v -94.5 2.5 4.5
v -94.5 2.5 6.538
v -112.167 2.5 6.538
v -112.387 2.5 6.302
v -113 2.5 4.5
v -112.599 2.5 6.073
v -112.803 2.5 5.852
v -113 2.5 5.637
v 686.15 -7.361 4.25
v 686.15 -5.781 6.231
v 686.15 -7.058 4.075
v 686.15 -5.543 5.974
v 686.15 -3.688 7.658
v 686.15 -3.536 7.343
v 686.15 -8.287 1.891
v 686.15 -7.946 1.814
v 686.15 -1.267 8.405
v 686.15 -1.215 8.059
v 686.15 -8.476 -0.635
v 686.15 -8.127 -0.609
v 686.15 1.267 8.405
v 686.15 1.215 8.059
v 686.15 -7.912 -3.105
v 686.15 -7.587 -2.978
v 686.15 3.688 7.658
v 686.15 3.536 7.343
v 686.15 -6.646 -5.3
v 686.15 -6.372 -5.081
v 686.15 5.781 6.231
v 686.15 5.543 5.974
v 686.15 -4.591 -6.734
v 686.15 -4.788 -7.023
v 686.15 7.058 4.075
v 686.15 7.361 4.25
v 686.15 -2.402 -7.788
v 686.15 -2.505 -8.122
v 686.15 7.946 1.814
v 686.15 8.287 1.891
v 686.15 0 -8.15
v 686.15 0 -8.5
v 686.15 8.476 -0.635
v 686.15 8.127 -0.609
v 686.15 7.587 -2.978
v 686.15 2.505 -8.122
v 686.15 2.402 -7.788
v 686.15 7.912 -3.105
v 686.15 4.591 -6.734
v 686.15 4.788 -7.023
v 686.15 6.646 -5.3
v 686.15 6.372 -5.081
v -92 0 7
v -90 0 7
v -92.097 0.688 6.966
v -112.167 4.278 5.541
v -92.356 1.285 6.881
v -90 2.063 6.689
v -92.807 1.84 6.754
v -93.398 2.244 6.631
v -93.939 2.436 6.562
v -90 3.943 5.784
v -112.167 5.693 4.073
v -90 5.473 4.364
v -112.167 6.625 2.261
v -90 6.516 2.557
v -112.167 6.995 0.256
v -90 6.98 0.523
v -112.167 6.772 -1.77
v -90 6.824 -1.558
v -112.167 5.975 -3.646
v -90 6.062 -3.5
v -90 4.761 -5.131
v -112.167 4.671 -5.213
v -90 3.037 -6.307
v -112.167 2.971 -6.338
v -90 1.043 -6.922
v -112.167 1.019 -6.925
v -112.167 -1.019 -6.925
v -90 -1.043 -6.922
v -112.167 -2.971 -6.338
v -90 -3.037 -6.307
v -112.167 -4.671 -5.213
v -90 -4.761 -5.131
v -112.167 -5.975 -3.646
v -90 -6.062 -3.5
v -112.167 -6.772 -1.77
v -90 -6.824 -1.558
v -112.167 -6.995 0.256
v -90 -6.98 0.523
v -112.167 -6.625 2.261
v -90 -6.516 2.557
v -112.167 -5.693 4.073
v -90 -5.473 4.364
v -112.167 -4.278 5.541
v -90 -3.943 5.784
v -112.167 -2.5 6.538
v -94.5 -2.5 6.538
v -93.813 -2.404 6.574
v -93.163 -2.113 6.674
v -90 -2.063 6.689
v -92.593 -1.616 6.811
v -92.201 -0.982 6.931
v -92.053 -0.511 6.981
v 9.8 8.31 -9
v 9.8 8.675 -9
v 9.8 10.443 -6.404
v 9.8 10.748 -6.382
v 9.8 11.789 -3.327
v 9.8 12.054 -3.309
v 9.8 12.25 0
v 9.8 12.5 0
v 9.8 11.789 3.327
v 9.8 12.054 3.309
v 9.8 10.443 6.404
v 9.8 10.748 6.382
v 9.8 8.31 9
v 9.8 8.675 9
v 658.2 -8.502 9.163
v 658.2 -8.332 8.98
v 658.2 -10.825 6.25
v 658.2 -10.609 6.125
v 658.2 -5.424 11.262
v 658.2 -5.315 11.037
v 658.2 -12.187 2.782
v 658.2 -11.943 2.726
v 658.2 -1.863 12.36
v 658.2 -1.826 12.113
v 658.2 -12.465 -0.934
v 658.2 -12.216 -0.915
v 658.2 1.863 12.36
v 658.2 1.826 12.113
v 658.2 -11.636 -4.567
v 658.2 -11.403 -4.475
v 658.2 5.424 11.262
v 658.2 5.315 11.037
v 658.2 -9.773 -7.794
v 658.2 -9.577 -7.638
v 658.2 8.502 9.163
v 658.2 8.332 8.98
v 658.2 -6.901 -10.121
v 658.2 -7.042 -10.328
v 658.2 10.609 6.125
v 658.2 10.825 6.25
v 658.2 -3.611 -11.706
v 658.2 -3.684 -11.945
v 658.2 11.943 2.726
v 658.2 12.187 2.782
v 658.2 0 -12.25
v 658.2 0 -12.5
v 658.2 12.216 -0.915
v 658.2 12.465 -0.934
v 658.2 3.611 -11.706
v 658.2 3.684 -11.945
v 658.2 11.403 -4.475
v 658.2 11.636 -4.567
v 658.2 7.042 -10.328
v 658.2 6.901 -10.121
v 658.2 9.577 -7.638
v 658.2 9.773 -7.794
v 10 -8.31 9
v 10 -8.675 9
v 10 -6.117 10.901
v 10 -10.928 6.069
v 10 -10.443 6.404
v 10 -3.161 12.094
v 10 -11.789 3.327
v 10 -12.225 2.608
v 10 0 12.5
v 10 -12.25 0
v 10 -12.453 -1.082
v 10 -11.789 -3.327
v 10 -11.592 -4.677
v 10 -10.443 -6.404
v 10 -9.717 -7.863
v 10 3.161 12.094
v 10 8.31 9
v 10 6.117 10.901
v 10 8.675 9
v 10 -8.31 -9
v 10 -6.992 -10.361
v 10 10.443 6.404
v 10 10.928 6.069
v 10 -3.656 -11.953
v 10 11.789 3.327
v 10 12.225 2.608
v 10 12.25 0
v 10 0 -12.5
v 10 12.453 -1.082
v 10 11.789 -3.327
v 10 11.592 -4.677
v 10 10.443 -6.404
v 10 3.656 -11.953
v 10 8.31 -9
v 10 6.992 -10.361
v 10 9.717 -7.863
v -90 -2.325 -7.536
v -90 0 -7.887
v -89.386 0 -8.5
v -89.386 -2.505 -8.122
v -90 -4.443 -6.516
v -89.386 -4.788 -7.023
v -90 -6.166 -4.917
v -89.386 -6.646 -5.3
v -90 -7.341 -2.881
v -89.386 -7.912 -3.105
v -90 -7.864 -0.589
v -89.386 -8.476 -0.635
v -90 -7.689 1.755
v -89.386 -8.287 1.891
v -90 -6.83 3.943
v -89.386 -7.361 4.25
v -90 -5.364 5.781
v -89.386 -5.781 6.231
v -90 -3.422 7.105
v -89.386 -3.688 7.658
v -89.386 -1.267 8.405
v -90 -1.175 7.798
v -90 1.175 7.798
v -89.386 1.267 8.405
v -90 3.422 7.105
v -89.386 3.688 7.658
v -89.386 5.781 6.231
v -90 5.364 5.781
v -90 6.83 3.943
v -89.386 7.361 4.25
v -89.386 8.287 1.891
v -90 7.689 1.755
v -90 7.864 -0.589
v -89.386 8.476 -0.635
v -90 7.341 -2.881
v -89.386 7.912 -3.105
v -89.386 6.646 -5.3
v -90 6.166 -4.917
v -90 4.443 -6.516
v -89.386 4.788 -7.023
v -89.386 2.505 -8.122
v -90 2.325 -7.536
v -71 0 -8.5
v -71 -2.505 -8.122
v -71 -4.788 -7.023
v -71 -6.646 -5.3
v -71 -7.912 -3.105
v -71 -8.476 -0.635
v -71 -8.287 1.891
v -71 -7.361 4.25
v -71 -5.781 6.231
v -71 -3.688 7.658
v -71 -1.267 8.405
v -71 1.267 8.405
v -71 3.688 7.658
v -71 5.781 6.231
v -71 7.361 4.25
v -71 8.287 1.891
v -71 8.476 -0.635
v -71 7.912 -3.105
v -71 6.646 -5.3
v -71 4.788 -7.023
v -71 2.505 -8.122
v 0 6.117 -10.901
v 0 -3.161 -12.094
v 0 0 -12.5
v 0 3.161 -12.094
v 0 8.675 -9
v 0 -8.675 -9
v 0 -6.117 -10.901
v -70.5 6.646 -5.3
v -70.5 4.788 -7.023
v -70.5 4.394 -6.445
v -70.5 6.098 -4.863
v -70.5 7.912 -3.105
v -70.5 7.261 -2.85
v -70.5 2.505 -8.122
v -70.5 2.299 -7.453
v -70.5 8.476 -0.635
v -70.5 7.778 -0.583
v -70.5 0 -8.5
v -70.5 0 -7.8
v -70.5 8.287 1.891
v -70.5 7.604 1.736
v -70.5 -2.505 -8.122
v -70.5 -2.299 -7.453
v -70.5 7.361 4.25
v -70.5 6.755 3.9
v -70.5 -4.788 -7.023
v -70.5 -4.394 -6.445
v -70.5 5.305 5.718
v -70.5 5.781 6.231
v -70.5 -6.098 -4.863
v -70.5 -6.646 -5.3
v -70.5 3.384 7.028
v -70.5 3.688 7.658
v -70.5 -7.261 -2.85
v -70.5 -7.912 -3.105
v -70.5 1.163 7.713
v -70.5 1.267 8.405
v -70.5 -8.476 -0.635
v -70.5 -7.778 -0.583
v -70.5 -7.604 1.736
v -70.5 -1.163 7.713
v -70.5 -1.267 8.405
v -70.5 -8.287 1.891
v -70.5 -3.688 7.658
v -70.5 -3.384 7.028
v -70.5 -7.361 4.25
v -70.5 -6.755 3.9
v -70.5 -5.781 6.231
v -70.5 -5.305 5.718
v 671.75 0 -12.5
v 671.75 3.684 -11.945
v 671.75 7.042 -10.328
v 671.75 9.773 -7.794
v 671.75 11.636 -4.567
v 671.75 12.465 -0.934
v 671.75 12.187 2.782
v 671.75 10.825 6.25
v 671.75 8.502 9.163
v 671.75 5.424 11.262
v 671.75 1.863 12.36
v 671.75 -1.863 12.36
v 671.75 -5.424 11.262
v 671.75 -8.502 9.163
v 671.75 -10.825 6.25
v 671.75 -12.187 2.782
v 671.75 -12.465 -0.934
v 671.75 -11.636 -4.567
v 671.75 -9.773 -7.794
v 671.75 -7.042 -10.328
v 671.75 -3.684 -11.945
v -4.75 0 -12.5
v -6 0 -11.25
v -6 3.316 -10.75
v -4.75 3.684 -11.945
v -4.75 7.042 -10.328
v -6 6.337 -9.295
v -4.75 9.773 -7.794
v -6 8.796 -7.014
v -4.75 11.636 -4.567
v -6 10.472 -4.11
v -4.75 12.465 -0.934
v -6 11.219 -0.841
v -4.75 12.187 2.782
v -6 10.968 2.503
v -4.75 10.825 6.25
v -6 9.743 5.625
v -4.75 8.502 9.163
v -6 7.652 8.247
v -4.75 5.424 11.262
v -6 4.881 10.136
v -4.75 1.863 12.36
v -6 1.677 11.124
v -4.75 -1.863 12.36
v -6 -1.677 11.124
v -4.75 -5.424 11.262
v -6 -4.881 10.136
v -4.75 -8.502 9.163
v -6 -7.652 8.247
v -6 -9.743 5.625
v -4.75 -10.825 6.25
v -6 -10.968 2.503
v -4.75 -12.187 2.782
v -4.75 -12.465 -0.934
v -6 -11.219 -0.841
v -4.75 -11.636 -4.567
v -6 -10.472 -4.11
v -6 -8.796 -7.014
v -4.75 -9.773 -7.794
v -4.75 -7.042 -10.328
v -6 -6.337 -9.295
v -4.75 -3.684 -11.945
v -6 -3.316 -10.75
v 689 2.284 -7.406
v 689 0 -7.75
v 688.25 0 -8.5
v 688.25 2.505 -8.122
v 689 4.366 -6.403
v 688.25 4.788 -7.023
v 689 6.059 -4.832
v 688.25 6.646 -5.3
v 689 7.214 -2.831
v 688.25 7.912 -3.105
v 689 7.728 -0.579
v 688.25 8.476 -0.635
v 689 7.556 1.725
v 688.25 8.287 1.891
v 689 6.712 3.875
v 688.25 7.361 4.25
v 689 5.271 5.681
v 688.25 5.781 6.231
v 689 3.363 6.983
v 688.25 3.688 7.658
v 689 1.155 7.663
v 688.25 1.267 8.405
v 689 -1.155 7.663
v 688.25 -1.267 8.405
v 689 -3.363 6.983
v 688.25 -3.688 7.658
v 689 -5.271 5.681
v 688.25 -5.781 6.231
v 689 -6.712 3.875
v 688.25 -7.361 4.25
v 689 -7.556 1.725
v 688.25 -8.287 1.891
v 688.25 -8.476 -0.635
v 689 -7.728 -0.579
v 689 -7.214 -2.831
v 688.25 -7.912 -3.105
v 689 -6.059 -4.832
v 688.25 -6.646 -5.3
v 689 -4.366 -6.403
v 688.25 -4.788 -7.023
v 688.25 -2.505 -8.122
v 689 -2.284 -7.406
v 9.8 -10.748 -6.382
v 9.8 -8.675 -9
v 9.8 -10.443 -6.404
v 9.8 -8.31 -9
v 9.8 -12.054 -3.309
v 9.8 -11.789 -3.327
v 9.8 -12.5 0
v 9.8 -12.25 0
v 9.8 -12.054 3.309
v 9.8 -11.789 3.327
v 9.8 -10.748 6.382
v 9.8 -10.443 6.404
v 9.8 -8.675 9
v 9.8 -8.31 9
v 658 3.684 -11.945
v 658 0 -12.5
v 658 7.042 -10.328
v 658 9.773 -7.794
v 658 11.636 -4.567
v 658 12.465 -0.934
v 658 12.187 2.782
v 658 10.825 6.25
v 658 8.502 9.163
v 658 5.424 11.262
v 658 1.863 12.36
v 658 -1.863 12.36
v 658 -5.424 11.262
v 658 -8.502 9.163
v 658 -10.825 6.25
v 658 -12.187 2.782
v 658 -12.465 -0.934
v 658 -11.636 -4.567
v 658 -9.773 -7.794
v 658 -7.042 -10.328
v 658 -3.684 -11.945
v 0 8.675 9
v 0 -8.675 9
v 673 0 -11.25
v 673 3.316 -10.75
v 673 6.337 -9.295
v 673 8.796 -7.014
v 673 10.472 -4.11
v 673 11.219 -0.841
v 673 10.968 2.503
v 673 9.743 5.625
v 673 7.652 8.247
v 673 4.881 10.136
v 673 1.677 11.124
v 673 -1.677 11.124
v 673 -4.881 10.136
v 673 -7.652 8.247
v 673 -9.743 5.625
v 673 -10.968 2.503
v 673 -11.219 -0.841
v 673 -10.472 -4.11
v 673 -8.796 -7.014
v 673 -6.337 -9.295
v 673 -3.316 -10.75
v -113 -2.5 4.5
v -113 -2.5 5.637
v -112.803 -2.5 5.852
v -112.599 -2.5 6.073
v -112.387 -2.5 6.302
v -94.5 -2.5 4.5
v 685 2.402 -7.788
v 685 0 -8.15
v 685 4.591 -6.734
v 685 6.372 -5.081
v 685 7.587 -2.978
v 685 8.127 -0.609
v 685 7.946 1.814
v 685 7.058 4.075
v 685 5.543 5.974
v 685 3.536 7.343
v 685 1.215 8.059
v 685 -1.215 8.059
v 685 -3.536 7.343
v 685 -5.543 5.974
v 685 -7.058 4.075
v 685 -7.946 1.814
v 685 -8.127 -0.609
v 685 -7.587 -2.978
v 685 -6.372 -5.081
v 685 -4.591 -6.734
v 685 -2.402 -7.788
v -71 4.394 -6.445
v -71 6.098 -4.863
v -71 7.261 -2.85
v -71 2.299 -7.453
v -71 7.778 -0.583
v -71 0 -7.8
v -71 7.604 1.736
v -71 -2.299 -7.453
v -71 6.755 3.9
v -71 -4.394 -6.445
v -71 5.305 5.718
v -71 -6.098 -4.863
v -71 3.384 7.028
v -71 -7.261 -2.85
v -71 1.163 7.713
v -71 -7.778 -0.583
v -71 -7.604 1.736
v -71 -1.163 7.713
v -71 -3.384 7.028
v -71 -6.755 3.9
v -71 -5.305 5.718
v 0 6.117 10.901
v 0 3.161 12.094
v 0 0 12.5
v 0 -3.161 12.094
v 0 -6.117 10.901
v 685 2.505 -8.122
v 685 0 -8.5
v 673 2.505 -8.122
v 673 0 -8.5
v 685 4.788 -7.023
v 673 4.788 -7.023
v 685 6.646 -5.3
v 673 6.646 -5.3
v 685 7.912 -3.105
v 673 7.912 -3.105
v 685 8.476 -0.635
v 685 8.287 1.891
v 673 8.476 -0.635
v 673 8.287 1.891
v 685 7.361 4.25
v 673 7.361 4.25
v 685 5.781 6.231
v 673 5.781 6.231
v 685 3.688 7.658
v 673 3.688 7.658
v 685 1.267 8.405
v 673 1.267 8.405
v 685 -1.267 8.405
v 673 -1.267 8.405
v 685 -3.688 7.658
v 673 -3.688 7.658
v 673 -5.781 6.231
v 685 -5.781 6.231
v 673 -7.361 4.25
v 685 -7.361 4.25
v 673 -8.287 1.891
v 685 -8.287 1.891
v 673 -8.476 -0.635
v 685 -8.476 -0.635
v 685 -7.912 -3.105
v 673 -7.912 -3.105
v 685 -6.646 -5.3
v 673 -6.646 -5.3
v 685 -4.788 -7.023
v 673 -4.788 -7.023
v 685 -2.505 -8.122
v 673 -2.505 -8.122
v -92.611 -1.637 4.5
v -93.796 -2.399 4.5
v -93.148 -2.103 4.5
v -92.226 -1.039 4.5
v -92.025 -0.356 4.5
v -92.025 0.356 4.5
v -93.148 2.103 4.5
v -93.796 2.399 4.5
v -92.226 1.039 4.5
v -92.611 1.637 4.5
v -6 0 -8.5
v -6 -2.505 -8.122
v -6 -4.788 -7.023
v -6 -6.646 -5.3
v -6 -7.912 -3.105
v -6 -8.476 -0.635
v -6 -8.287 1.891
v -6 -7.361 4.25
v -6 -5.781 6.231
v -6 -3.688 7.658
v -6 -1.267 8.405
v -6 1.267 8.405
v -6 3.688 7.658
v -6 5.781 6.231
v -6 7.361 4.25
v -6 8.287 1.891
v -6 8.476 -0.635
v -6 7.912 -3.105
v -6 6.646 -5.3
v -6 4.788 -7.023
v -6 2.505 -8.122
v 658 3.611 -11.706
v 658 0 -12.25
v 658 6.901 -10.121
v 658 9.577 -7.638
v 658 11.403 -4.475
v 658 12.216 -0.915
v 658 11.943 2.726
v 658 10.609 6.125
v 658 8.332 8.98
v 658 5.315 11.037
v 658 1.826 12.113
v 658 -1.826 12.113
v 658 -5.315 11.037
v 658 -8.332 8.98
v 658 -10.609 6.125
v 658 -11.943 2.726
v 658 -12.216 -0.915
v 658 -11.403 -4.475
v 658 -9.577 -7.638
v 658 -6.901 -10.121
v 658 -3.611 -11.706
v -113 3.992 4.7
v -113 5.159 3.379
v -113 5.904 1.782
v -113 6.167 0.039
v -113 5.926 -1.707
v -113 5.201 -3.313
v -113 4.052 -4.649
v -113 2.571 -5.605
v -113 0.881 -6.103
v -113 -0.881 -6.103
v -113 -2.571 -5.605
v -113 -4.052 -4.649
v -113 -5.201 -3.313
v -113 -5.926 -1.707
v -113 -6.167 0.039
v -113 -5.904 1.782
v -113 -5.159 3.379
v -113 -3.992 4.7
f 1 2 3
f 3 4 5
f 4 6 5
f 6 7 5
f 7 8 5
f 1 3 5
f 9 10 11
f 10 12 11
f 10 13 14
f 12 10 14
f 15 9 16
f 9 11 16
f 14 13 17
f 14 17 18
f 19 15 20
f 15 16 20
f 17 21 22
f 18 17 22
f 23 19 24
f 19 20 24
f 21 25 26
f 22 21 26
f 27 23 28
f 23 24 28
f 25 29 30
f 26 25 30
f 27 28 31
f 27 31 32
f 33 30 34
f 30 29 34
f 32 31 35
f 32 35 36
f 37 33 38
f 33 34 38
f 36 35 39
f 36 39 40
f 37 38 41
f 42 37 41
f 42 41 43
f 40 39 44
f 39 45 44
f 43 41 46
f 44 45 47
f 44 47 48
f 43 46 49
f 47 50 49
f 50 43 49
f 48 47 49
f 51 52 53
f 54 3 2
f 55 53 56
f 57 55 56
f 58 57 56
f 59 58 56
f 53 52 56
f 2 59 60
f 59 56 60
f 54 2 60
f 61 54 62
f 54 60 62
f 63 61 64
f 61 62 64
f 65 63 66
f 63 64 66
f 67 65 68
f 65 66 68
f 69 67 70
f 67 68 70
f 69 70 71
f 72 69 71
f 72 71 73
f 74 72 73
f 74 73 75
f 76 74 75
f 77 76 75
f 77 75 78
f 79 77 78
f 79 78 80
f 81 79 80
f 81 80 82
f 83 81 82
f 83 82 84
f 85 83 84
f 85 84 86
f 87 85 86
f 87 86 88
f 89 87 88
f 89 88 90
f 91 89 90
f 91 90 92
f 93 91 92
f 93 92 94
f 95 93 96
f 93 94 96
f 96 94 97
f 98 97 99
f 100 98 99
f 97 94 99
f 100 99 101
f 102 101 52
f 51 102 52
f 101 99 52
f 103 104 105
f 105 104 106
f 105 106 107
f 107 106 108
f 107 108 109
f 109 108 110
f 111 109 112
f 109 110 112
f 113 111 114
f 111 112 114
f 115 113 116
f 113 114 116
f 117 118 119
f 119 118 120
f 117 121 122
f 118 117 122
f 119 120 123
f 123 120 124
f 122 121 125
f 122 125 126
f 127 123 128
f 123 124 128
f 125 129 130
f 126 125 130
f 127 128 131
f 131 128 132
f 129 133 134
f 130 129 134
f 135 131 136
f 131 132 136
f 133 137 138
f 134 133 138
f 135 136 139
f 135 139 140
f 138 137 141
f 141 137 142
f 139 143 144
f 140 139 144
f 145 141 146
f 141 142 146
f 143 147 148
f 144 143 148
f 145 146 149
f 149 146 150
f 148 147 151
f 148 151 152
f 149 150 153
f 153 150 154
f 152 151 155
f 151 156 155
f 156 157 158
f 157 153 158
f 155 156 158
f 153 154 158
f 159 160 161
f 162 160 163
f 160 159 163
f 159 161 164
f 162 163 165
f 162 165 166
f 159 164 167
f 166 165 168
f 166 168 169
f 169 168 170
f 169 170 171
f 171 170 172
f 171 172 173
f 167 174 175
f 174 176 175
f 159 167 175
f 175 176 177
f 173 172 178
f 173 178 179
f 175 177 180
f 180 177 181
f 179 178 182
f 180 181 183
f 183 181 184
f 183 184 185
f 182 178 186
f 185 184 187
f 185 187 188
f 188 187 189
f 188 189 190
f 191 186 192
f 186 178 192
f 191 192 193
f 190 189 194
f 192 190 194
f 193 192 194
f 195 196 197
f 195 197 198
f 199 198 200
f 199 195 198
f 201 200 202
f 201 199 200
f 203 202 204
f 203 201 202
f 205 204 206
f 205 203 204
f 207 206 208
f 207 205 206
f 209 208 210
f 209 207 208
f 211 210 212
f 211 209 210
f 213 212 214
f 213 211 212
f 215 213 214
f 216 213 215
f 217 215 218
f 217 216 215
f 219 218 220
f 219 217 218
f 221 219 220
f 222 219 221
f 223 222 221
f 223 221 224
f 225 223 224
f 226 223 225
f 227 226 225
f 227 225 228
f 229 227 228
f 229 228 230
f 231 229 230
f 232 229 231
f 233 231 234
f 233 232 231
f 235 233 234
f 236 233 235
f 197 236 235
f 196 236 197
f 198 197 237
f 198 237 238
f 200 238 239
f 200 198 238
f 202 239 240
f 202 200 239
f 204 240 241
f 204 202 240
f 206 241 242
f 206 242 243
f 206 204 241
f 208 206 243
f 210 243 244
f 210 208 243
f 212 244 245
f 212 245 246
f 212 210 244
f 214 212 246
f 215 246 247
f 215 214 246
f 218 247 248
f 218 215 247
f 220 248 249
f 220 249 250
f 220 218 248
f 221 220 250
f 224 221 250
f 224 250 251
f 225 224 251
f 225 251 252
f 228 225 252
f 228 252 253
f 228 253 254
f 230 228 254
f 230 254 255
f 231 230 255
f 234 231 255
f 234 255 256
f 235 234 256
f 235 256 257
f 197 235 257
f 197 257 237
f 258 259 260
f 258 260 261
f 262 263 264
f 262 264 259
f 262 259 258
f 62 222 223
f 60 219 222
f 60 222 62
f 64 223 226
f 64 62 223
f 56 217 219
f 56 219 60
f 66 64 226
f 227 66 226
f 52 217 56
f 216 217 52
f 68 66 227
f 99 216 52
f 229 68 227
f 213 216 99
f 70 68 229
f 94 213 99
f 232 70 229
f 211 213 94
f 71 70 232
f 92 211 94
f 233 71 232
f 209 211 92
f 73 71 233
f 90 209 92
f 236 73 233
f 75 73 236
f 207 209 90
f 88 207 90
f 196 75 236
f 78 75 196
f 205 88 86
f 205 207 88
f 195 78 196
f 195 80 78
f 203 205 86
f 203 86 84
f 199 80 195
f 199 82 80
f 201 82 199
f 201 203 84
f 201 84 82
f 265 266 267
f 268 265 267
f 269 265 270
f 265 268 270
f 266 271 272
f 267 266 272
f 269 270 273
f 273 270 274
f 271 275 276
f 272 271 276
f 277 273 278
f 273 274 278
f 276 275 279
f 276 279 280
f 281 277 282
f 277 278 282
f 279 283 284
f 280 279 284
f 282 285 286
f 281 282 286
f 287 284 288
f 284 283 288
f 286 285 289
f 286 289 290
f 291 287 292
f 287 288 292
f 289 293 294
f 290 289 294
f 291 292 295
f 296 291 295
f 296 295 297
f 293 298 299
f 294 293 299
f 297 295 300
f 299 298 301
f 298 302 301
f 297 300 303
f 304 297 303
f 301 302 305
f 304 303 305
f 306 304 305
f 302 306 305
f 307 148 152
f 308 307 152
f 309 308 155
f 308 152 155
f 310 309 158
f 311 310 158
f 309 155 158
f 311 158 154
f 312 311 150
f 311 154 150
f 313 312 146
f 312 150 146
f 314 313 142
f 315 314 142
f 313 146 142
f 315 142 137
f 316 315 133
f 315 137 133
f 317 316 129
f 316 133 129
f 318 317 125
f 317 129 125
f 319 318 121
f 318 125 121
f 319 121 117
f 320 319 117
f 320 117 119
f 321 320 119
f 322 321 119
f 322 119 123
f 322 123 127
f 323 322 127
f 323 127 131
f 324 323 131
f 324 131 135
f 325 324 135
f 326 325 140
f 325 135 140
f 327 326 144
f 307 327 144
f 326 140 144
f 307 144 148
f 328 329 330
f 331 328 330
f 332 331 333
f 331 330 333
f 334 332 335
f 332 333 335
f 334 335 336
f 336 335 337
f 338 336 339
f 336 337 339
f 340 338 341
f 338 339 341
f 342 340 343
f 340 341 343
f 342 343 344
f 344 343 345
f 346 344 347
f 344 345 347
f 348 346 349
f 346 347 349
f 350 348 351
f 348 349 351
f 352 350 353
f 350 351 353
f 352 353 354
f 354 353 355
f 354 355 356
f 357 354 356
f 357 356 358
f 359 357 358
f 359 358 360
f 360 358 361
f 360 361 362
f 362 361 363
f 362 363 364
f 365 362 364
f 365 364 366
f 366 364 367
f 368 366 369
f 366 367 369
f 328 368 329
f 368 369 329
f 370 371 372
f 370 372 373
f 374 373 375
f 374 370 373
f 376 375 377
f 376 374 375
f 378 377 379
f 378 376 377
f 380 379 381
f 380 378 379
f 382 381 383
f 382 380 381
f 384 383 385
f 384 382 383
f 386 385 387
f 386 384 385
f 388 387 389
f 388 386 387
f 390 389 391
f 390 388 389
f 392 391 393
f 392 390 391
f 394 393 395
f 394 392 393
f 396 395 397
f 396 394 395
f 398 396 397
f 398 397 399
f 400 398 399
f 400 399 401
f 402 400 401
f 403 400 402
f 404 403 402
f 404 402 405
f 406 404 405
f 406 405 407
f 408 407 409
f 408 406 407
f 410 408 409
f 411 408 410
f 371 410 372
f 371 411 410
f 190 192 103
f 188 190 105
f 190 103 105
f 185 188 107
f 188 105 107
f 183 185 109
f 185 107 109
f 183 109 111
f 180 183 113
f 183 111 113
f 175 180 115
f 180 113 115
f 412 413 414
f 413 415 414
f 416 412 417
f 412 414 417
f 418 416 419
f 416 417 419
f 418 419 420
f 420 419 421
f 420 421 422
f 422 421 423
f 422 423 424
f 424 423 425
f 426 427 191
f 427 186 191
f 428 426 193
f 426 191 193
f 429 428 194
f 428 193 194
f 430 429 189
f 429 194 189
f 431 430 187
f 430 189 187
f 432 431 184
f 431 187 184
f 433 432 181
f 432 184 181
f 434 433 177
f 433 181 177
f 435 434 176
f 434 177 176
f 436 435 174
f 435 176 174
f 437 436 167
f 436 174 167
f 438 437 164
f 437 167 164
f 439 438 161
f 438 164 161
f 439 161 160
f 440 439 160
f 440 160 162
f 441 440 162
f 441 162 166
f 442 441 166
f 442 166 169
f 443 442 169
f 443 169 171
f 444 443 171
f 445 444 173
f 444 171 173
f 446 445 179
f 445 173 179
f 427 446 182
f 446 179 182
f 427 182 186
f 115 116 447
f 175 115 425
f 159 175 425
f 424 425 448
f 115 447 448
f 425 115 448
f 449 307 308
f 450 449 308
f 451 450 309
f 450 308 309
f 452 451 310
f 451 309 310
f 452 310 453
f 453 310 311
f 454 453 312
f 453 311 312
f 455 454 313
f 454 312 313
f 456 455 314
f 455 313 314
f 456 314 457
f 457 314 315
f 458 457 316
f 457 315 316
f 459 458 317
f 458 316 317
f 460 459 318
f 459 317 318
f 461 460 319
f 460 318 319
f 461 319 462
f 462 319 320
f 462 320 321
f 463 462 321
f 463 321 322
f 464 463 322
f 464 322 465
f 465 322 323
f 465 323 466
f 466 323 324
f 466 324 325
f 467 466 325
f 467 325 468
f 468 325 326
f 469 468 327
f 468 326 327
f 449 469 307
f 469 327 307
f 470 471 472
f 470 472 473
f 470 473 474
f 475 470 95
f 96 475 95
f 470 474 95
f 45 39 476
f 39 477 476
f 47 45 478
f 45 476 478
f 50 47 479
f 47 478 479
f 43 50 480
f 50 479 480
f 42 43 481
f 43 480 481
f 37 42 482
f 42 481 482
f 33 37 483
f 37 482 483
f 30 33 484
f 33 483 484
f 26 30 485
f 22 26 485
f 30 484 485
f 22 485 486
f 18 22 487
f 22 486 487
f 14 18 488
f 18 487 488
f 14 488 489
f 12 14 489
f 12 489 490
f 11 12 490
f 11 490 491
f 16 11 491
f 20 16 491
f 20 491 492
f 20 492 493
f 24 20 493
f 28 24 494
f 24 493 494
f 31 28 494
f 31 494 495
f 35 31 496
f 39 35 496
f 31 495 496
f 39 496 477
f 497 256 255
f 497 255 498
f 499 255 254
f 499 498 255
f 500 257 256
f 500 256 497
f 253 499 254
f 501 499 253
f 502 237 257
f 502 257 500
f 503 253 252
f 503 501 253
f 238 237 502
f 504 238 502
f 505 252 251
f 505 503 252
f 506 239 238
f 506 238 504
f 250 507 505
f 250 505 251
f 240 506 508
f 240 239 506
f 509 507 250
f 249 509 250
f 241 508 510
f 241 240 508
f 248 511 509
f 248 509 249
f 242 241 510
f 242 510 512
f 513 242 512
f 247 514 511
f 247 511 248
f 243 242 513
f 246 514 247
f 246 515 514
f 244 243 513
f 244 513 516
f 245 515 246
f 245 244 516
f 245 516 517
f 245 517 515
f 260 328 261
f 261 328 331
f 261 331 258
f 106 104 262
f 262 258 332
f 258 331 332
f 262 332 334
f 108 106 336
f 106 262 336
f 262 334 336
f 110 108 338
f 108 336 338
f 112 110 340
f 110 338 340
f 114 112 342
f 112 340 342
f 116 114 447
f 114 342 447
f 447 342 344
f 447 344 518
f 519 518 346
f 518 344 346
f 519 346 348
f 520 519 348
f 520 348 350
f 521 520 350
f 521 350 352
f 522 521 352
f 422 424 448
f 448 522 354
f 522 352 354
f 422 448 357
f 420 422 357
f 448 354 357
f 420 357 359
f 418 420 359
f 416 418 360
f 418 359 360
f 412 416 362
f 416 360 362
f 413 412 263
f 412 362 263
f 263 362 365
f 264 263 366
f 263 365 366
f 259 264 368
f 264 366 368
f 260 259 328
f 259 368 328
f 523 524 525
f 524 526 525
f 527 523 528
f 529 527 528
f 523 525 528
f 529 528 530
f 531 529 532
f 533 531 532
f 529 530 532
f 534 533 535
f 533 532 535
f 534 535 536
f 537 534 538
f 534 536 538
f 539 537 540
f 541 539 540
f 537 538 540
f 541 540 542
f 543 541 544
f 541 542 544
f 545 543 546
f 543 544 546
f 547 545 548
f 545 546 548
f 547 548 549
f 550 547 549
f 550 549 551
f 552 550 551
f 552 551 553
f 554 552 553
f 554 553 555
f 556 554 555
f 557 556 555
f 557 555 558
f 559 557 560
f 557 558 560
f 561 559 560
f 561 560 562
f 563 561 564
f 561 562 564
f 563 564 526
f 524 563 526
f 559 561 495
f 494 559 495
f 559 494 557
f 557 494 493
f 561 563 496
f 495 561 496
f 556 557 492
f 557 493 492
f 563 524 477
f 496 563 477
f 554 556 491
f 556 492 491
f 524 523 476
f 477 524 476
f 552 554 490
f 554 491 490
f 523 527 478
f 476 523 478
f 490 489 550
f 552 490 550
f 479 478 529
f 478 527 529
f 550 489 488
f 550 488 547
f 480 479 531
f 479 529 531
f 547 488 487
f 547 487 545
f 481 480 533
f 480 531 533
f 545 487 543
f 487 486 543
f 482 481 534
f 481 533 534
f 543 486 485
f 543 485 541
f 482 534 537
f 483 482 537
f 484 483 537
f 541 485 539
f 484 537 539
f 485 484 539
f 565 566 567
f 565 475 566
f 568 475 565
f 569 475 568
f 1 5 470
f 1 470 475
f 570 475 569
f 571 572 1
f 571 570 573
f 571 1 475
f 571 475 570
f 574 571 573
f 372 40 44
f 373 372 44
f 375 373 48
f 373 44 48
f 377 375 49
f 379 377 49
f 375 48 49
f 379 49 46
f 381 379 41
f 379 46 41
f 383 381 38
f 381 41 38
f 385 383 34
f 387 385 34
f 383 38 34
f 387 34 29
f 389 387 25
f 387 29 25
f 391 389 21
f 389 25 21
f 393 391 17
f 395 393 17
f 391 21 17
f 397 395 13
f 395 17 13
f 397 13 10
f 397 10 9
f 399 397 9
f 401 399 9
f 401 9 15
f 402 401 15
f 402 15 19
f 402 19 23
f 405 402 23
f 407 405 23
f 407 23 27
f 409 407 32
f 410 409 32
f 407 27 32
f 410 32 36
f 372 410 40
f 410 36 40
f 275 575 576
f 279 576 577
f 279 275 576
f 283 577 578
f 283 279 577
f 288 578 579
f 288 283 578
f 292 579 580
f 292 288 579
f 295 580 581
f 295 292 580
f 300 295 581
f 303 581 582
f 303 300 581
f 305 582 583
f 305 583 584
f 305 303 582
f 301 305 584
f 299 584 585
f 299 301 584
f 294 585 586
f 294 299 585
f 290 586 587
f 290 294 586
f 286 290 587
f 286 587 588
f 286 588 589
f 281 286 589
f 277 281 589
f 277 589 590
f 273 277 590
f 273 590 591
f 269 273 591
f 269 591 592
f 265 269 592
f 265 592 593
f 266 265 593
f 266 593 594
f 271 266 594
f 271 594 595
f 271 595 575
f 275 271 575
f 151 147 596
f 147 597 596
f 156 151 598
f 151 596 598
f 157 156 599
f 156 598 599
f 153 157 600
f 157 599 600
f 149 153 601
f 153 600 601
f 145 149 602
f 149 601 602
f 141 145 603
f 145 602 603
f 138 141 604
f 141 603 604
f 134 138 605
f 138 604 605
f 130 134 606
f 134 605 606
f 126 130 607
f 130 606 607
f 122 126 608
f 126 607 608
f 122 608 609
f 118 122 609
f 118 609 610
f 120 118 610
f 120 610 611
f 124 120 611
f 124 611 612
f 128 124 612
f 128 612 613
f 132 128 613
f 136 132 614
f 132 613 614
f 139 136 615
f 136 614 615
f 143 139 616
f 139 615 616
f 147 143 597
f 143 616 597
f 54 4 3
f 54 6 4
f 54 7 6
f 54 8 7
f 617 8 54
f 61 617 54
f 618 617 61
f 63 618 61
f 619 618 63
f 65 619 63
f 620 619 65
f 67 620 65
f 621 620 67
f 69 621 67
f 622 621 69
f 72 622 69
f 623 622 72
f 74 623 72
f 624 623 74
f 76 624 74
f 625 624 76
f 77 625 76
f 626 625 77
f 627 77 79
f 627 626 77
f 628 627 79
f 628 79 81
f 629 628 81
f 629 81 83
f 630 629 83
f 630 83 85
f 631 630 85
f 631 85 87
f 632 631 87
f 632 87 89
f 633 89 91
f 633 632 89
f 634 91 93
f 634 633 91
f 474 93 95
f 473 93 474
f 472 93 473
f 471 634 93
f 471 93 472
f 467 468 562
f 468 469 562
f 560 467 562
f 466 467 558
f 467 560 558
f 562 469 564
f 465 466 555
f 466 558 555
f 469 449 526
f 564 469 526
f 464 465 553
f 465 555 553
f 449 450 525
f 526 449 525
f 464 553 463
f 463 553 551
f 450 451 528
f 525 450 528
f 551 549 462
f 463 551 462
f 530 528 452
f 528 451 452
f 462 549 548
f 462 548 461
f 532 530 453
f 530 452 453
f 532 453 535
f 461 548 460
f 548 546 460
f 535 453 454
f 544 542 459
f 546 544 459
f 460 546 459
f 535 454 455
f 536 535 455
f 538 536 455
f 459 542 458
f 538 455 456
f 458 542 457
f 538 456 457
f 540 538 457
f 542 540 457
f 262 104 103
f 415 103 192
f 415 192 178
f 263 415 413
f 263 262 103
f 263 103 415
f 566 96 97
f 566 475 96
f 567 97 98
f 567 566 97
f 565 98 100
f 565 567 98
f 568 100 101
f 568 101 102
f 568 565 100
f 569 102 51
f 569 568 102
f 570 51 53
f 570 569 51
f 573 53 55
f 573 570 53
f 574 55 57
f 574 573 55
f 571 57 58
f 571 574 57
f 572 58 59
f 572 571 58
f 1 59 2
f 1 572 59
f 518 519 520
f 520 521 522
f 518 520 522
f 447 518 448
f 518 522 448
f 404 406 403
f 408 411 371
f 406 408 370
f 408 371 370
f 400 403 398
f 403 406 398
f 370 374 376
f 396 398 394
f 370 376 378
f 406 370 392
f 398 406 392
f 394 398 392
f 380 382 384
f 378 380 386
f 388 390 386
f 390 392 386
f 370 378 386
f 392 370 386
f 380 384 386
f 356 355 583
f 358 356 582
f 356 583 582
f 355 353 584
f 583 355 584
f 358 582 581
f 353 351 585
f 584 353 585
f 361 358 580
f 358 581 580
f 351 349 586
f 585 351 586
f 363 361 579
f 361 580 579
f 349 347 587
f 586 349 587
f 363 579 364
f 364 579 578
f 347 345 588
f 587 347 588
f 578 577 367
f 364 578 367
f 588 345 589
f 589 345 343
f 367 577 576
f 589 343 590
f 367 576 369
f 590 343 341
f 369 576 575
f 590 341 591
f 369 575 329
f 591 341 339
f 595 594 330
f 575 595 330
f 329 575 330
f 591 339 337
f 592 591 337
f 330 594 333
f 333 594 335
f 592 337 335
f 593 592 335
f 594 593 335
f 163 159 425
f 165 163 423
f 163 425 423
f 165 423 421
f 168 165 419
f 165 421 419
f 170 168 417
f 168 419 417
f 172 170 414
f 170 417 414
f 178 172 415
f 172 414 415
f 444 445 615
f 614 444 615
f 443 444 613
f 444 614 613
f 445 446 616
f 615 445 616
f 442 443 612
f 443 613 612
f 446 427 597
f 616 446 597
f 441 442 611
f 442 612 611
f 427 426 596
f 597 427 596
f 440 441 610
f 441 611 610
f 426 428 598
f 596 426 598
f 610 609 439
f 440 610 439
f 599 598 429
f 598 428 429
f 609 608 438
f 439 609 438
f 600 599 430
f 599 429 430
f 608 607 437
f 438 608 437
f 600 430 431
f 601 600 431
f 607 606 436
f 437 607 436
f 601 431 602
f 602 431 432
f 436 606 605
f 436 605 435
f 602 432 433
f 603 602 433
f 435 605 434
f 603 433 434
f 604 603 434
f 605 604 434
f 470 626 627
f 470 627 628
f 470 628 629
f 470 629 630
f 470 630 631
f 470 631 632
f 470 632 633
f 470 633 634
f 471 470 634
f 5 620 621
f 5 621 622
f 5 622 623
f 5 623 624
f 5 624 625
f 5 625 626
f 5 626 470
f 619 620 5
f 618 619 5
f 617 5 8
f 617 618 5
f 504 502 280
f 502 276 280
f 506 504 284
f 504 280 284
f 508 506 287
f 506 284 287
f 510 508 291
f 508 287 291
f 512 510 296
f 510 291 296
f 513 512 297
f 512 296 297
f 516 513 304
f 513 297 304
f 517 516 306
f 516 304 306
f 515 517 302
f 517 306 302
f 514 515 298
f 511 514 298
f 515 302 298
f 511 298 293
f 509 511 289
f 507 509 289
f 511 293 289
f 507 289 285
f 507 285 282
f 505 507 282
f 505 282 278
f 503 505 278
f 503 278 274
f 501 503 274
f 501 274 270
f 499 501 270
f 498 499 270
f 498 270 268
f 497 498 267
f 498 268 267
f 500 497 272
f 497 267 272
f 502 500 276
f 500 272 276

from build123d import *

# Parameters (mm, degrees)
EXTRUDE1_START = 84
SKETCH2_R      = 8.5
EXTRUDE1_DEPTH = 84
SKETCH3_R      = 7
EXTRUDE2_DEPTH = 23
EXTRUDE4_START = 6
EXTRUDE4_DEPTH = 10
EXTRUDE5_START = -6
EXTRUDE5_DEPTH = 10
CHAMFER1_SIZE  = 0.6135
CHAMFER2_SIZE  = 0.833333333
CHAMFER4_SIZE  = 0.75
CHAMFER5_SIZE  = 1.25
EXTRUDE6_DEPTH = 18.5
SKETCH7_R      = 2.5
EXTRUDE7_DEPTH = 7.62
SKETCH8_W      = 0.5
SKETCH8_H      = 0.7
CHAMFER6_SIZE  = 1.25


with BuildPart() as part:
    # Sketch1 → Revolve1 (revolve)
    with BuildSketch(Plane.XY, mode=Mode.PRIVATE) as revolve1_sk:
        Polygon((-6, 12.5), (-6, 0), (689, 0), (689, 8.5), (686.15, 8.5), (686.15, 8.15), (685, 8.15), (685, 8.5), (673, 8.5), (673, 12.5), (658.2, 12.5), (658.2, 12.25), (658, 12.25), (658, 12.5), (10, 12.5), (10, 12.25), (9.8, 12.25), (9.8, 12.5), align=None)
    revolve(revolve1_sk.sketch.rotate(Axis((-6, 0, 0), (1, 0, 0)), 270), axis=Axis((-6, 0, 0), (1, 0, 0)))

    # Sketch2 → Extrude1 (add)
    with BuildSketch(Plane.ZY.offset(6).offset(EXTRUDE1_START)):
        with Locations(Location((0, 0, 0), (0, 0, 180))):
            Circle(SKETCH2_R)
    extrude(amount=-EXTRUDE1_DEPTH)

    # Sketch3 → Extrude2 (add)
    with BuildSketch(Plane.ZY.offset(90)):
        Circle(SKETCH3_R)
    extrude(amount=EXTRUDE2_DEPTH)

    # Sketch5 → Extrude4 (cut)
    with BuildSketch(Plane(origin=(-6, 0, 0), x_dir=(0, 0, -1), z_dir=(1, 0, 0)).offset(EXTRUDE4_START)):
        with BuildLine():
            Line((9, 8.674675786), (9, -8.674675786))
            ThreePointArc((9, -8.674675786), (12.5, 0), (9, 8.674675786))
        make_face()
    extrude(amount=EXTRUDE4_DEPTH, mode=Mode.SUBTRACT)

    # Sketch6 → Extrude5 (cut)
    with BuildSketch(Plane(origin=(-6, 0, 0), x_dir=(0, -1, 0), z_dir=(-1, 0, 0)).offset(EXTRUDE5_START)):
        with BuildLine():
            Line((-8.674675786, 9), (8.674675786, 9))
            ThreePointArc((8.674675786, 9), (0, 12.5), (-8.674675786, 9))
        make_face()
    extrude(amount=-EXTRUDE5_DEPTH, mode=Mode.SUBTRACT)

    # Chamfer1
    chamfer1_edges = [part.edges().sort_by_distance(p)[0] for p in [
        (-90, 0, 8.5),
    ]]
    chamfer(chamfer1_edges, length=CHAMFER1_SIZE)

    # Chamfer2
    chamfer2_edges = [part.edges().sort_by_distance(p)[0] for p in [
        (-113, 0, -7),
    ]]
    chamfer(chamfer2_edges, length=CHAMFER2_SIZE)

    # Chamfer4
    chamfer4_edges = [part.edges().sort_by_distance(p)[0] for p in [
        (689, 0, 8.5),
    ]]
    chamfer(chamfer4_edges, length=CHAMFER4_SIZE)

    # Chamfer5
    chamfer5_edges = [part.edges().sort_by_distance(p)[0] for p in [
        (673, 0, 12.5),
    ]]
    chamfer(chamfer5_edges, length=CHAMFER5_SIZE)

    # Sketch4 → Extrude6 (cut)
    with BuildSketch(Plane.ZY.offset(113)):
        with BuildLine():
            Line((7.071067812, 2.5), (4.5, 2.5))
            Line((4.5, 2.5), (4.5, -2.5))
            Line((4.5, -2.5), (7.071067812, -2.5))
            ThreePointArc((7.071067812, -2.5), (7.5, 0), (7.071067812, 2.5))
        make_face()
    extrude(amount=-EXTRUDE6_DEPTH, mode=Mode.SUBTRACT)

    # Sketch7 → Extrude7 (cut)
    with BuildSketch(Plane.XY.offset(4.5)):
        with Locations((-94.5, 0)):
            Circle(SKETCH7_R)
    extrude(amount=EXTRUDE7_DEPTH, mode=Mode.SUBTRACT)

    # Sketch8 → Cut-Revolve1 (revolve, cut)
    with BuildSketch(Plane(origin=(0, 0, 0), x_dir=(1, 0, 0), z_dir=(0, 1, 0))):
        with Locations((-70.75, 8.15)):
            Rectangle(SKETCH8_W, SKETCH8_H)
    revolve(axis=Axis((0, 0, 0), (-1, 0, 0)), mode=Mode.SUBTRACT)

    # Chamfer6
    chamfer6_edges = [part.edges().sort_by_distance(p)[0] for p in [
        (-6, 0, 12.5),
    ]]
    chamfer(chamfer6_edges, length=CHAMFER6_SIZE)


solid = part.part
